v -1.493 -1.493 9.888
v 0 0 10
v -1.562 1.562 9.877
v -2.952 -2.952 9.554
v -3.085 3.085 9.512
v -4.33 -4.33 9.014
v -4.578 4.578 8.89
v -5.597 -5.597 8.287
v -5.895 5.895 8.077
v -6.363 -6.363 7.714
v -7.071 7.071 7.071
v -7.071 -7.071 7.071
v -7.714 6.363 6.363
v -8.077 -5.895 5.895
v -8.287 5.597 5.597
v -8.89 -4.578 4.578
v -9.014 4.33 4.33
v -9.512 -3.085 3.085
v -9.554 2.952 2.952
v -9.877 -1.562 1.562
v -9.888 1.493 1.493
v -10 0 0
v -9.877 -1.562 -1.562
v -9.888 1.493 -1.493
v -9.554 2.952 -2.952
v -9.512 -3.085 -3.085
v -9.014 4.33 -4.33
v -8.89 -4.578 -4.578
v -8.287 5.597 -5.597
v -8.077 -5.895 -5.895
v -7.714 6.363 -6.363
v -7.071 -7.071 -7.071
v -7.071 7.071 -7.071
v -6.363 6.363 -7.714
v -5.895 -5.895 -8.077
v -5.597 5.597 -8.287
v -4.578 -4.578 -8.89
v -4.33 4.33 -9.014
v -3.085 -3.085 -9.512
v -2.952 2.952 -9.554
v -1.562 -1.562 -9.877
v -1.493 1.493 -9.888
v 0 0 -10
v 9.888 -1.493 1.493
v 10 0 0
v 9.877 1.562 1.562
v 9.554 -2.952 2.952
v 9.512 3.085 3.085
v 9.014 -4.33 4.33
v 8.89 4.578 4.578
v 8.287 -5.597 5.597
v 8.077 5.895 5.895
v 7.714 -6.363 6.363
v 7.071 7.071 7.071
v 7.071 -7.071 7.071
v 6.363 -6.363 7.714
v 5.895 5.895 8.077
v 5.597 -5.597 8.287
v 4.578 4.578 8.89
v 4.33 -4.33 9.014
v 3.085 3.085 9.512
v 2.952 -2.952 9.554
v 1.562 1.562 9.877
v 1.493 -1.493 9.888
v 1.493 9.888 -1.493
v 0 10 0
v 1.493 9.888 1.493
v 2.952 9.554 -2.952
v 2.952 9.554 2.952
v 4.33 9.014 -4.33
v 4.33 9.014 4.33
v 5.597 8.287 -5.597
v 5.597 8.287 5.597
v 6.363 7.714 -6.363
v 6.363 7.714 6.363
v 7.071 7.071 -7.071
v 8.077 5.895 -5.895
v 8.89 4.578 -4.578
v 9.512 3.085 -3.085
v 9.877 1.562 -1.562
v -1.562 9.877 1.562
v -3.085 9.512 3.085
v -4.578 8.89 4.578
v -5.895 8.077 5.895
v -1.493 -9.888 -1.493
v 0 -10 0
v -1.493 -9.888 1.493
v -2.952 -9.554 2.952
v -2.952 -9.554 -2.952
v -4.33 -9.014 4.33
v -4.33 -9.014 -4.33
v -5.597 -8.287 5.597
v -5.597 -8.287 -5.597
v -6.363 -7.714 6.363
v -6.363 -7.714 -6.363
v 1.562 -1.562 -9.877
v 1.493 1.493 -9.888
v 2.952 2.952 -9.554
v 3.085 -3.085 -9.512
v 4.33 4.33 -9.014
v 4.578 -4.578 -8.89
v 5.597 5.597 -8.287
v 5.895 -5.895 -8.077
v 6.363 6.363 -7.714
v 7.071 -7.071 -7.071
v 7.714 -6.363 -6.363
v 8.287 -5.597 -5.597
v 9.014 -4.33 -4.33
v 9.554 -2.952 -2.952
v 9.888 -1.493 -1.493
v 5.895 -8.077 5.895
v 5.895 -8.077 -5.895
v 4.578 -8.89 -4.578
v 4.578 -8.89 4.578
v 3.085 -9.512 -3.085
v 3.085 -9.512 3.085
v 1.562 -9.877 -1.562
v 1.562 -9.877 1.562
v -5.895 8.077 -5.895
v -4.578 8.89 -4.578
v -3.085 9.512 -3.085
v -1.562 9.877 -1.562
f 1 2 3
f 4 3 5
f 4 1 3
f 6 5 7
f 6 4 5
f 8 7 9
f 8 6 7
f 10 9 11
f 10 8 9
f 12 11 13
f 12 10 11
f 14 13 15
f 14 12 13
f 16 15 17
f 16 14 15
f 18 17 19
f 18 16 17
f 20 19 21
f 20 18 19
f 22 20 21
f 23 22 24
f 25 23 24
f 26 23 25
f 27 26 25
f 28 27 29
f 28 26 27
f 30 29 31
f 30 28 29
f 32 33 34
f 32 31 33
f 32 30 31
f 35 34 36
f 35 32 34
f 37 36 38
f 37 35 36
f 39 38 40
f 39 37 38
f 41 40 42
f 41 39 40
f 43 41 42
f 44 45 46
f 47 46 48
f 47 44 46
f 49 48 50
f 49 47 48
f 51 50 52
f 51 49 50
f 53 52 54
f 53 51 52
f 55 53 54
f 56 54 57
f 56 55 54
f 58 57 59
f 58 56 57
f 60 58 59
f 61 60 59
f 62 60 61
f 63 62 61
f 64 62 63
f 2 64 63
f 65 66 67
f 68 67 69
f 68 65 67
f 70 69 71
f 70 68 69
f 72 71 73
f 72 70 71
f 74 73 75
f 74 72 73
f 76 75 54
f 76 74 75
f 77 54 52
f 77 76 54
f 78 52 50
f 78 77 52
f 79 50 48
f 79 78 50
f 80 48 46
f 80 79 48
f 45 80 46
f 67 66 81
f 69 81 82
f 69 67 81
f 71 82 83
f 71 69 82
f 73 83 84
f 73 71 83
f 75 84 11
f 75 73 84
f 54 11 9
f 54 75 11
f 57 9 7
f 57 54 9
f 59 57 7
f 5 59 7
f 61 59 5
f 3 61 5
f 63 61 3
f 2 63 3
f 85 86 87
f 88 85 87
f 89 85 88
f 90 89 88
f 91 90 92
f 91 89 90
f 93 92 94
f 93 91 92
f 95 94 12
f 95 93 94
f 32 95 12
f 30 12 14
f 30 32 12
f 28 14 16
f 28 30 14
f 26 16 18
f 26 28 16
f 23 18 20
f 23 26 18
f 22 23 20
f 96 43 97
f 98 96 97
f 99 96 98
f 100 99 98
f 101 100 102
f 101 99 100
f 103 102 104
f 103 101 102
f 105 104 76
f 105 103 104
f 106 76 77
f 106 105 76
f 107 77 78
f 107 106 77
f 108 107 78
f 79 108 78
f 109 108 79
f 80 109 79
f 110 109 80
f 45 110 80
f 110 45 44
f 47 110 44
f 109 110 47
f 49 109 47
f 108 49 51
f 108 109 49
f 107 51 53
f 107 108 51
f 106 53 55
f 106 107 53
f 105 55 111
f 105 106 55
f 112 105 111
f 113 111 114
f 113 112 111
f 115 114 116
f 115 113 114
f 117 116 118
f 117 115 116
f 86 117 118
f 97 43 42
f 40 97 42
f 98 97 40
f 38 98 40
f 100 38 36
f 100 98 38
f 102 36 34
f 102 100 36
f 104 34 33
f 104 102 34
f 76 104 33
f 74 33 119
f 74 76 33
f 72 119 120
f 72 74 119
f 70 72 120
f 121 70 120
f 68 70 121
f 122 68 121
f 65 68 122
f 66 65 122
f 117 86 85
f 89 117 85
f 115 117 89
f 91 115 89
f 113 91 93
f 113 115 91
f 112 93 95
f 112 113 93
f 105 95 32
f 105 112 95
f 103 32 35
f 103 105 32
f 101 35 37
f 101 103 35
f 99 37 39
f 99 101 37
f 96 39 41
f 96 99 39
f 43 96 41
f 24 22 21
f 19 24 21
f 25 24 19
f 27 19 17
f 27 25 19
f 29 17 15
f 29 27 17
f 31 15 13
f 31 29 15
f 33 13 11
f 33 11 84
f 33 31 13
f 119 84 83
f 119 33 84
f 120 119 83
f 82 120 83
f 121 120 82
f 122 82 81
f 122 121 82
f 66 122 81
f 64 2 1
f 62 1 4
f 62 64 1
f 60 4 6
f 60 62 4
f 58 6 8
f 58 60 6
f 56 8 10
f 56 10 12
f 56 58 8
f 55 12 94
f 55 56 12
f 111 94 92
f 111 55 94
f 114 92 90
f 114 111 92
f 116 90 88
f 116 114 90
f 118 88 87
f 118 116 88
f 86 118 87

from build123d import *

# Parameters (mm, degrees)
F0_R     = 10
F1_DEPTH = 38.1
F4_COUNT = 3


with BuildPart() as f1:
    # F0 (on Front) → F1 (new body, symmetric)
    with BuildSketch(Plane.XZ):
        Circle(F0_R)
    extrude(amount=F1_DEPTH, both=True)


with BuildPart() as f4_1:
    # F4: instance of F1
    add(f1.part.rotate(Axis((-10, 10, 10), (-0.5773502692, 0.5773502692, 0.5773502692)), 1 * 360 / F4_COUNT))


with BuildPart() as f4_2:
    # F4: instance of F1
    add(f1.part.rotate(Axis((-10, 10, 10), (-0.5773502692, 0.5773502692, 0.5773502692)), 2 * 360 / F4_COUNT))

    # F5: intersect F4_1, F1
    add(f4_1.part, mode=Mode.INTERSECT)
    add(f1.part, mode=Mode.INTERSECT)


solid = f4_2.part
